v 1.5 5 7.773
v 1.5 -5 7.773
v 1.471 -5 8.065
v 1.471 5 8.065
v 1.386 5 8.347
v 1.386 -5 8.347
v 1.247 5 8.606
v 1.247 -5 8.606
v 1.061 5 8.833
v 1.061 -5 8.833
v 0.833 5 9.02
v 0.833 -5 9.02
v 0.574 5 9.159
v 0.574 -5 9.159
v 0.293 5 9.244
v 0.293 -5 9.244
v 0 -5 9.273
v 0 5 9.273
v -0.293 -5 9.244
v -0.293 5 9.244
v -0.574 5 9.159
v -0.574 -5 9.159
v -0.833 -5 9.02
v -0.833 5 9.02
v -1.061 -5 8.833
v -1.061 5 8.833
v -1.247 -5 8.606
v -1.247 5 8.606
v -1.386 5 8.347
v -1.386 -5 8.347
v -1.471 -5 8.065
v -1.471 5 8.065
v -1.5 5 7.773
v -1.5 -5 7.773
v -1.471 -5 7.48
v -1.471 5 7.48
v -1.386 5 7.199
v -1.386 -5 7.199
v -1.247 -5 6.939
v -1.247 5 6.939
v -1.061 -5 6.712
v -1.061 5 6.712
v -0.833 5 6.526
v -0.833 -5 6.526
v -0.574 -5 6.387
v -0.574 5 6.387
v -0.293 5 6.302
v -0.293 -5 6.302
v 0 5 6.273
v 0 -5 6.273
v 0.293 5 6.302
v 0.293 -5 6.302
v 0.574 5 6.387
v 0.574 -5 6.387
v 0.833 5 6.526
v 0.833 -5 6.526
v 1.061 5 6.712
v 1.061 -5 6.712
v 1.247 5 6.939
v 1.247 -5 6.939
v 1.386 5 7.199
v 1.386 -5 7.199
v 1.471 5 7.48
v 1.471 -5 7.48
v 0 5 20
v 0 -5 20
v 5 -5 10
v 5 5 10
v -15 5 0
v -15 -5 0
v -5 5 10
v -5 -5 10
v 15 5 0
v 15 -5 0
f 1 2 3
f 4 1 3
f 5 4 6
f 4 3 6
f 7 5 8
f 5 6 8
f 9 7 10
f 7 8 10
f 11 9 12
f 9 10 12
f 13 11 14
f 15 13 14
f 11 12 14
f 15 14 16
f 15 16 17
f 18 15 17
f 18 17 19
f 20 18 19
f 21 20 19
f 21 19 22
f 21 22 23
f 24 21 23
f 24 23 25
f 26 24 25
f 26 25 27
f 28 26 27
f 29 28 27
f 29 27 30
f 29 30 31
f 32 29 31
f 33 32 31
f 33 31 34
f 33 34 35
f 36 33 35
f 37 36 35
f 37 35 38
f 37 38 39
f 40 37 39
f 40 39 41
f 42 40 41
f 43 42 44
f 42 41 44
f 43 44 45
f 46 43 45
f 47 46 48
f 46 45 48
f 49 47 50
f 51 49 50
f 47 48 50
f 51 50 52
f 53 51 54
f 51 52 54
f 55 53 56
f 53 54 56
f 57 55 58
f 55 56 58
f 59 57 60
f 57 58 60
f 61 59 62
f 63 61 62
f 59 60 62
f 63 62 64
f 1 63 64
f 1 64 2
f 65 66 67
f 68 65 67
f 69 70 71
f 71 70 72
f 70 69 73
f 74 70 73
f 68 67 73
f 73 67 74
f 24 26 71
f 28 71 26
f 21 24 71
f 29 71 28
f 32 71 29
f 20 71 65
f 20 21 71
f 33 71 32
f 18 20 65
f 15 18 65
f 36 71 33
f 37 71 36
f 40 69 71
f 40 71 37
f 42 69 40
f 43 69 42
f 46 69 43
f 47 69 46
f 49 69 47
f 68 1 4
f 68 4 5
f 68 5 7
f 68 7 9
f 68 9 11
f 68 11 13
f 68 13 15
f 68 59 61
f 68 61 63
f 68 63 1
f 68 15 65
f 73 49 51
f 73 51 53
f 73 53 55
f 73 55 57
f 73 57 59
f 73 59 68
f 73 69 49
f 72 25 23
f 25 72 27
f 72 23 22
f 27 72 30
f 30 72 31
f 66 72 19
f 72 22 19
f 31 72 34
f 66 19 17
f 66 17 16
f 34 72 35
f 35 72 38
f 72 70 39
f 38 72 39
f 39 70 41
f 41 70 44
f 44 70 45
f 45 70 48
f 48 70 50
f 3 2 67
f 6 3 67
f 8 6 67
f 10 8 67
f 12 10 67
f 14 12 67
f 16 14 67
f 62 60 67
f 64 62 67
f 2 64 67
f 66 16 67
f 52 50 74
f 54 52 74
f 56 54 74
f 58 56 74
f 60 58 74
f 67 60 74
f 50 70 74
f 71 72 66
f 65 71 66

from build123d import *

# Parameters (mm, degrees)
F0_W     = 30
F0_H     = 10
F1_DEPTH = 10
F2_W     = 10
F2_H     = 10
F3_DEPTH = 10
F4_R     = 1.5
F5_DEPTH = 10.001
F7_DEPTH = 10.001


with BuildPart() as f1:
    # F0 (on Top) → F1 (new body)
    with BuildSketch(Plane.XY):
        Rectangle(F0_W, F0_H)
    extrude(amount=F1_DEPTH)

    # F2 (on face) → F3 (join)
    with BuildSketch(Plane.XY.offset(10)):
        Rectangle(F2_W, F2_H)
    extrude(amount=F3_DEPTH)

    # F4 (on face) → F5 (cut, through all)
    with BuildSketch(Plane.XZ.offset(5)):
        with Locations((0, 7.772714)):
            Circle(F4_R)
    extrude(amount=-F5_DEPTH, mode=Mode.SUBTRACT)

    # F6 (on face) → F7 (cut, through all)
    with BuildSketch(Plane.XZ.offset(5)):
        Polygon((-15, 0), (-5, 10), (-15, 10), align=None)
        Polygon((-5, 20), (-5, 10), (0, 20), align=None)
        Polygon((5, 20), (0, 20), (5, 10), align=None)
        Polygon((15, 10), (5, 10), (15, 0), align=None)
    extrude(amount=-F7_DEPTH, mode=Mode.SUBTRACT)


solid = f1.part
